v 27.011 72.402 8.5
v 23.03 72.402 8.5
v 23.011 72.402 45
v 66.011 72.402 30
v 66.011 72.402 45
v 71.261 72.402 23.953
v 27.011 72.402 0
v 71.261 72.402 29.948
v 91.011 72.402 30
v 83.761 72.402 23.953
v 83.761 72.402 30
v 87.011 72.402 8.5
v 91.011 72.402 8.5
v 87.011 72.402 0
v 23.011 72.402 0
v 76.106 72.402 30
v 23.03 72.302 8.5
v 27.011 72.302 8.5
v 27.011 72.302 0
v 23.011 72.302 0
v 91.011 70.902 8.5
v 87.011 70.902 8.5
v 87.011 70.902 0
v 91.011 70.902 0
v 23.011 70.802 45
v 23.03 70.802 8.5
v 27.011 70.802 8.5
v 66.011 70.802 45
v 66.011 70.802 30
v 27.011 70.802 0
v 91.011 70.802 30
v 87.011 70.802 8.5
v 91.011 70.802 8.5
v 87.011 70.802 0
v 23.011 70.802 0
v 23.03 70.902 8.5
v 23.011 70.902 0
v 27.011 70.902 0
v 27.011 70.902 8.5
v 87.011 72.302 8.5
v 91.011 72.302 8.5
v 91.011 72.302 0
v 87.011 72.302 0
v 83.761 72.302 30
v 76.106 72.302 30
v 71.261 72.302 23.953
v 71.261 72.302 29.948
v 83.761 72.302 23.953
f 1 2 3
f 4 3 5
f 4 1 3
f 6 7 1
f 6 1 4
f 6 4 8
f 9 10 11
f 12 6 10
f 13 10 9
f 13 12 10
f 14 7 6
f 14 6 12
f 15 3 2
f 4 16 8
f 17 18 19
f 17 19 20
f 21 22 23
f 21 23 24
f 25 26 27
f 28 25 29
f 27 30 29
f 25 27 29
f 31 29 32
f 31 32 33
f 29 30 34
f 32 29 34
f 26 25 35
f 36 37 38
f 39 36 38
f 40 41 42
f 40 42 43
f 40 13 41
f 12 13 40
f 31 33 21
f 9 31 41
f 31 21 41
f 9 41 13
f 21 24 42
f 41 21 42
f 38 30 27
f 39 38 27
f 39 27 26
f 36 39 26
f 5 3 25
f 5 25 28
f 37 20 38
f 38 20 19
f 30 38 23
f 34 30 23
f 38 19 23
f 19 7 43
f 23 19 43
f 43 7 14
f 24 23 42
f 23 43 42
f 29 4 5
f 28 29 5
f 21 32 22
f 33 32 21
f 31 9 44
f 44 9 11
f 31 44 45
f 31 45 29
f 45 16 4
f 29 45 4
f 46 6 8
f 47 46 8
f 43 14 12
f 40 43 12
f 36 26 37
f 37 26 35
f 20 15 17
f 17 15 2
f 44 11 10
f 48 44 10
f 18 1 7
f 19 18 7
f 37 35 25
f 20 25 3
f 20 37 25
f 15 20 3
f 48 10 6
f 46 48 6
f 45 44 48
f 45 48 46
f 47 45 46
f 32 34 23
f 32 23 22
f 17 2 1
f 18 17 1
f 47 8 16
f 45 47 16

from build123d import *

# Parameters (mm, degrees)
ESQUISSE1_W             = 68
ESQUISSE1_H             = 1.6
EXTRUSION1_DEPTH        = 45
ESQUISSE2_W             = 25
ESQUISSE2_H             = 34
ENL_V_MAT_EXTRU_1_DEPTH = 2
ESQUISSE4_W             = 4.000005344
ESQUISSE4_H             = 8.5
ENL_V_MAT_EXTRU_2_DEPTH = 0.1
ESQUISSE5_W             = 4.000005344
ESQUISSE5_H             = 8.5
ENL_V_MAT_EXTRU_3_DEPTH = 0.1


with BuildPart() as part:
    # Esquisse1 → Extrusion1 (new body)
    with BuildSketch(Plane.XY):
        with Locations((57.011095297, 71.602293989)):
            Rectangle(ESQUISSE1_W, ESQUISSE1_H)
    extrude(amount=EXTRUSION1_DEPTH)

    # Esquisse2 → Enlèv. mat.-Extru.1 (cut)
    with BuildSketch(Plane(origin=(0, 72.402293989, 0), x_dir=(-1, 0, 0), z_dir=(0, 1, 0))):
        with Locations((-78.511095297, 47)):
            Rectangle(ESQUISSE2_W, ESQUISSE2_H)
    extrude(amount=-ENL_V_MAT_EXTRU_1_DEPTH, mode=Mode.SUBTRACT)

    # Esquisse4 → Enlèv. mat.-Extru.2 (cut)
    with BuildSketch(Plane(origin=(0, 72.402293989, 0), x_dir=(-1, 0, 0), z_dir=(0, 1, 0))):
        with Locations((-89.011092625, 4.25)):
            Rectangle(ESQUISSE4_W, ESQUISSE4_H)
        Polygon((-27.011089953, 8.5), (-27.011089953, 0), (-23.011095297, 0), (-23.029811449, 8.5), align=None)
        Polygon((-83.761089902, 23.952607164), (-71.261089902, 23.952607164), (-71.261089902, 29.947835896), (-83.761089902, 30.082433695), align=None)
    extrude(amount=-ENL_V_MAT_EXTRU_2_DEPTH, mode=Mode.SUBTRACT)

    # Esquisse5 → Enlèv. mat.-Extru.3 (cut)
    with BuildSketch(Plane.XZ.offset(-70.802293989)):
        Polygon((23.029811449, 8.5), (23.011095297, 0), (27.011089953, 0), (27.011089953, 8.5), align=None)
        with Locations((89.011092625, 4.25)):
            Rectangle(ESQUISSE5_W, ESQUISSE5_H)
    extrude(amount=-ENL_V_MAT_EXTRU_3_DEPTH, mode=Mode.SUBTRACT)


solid = part.part
